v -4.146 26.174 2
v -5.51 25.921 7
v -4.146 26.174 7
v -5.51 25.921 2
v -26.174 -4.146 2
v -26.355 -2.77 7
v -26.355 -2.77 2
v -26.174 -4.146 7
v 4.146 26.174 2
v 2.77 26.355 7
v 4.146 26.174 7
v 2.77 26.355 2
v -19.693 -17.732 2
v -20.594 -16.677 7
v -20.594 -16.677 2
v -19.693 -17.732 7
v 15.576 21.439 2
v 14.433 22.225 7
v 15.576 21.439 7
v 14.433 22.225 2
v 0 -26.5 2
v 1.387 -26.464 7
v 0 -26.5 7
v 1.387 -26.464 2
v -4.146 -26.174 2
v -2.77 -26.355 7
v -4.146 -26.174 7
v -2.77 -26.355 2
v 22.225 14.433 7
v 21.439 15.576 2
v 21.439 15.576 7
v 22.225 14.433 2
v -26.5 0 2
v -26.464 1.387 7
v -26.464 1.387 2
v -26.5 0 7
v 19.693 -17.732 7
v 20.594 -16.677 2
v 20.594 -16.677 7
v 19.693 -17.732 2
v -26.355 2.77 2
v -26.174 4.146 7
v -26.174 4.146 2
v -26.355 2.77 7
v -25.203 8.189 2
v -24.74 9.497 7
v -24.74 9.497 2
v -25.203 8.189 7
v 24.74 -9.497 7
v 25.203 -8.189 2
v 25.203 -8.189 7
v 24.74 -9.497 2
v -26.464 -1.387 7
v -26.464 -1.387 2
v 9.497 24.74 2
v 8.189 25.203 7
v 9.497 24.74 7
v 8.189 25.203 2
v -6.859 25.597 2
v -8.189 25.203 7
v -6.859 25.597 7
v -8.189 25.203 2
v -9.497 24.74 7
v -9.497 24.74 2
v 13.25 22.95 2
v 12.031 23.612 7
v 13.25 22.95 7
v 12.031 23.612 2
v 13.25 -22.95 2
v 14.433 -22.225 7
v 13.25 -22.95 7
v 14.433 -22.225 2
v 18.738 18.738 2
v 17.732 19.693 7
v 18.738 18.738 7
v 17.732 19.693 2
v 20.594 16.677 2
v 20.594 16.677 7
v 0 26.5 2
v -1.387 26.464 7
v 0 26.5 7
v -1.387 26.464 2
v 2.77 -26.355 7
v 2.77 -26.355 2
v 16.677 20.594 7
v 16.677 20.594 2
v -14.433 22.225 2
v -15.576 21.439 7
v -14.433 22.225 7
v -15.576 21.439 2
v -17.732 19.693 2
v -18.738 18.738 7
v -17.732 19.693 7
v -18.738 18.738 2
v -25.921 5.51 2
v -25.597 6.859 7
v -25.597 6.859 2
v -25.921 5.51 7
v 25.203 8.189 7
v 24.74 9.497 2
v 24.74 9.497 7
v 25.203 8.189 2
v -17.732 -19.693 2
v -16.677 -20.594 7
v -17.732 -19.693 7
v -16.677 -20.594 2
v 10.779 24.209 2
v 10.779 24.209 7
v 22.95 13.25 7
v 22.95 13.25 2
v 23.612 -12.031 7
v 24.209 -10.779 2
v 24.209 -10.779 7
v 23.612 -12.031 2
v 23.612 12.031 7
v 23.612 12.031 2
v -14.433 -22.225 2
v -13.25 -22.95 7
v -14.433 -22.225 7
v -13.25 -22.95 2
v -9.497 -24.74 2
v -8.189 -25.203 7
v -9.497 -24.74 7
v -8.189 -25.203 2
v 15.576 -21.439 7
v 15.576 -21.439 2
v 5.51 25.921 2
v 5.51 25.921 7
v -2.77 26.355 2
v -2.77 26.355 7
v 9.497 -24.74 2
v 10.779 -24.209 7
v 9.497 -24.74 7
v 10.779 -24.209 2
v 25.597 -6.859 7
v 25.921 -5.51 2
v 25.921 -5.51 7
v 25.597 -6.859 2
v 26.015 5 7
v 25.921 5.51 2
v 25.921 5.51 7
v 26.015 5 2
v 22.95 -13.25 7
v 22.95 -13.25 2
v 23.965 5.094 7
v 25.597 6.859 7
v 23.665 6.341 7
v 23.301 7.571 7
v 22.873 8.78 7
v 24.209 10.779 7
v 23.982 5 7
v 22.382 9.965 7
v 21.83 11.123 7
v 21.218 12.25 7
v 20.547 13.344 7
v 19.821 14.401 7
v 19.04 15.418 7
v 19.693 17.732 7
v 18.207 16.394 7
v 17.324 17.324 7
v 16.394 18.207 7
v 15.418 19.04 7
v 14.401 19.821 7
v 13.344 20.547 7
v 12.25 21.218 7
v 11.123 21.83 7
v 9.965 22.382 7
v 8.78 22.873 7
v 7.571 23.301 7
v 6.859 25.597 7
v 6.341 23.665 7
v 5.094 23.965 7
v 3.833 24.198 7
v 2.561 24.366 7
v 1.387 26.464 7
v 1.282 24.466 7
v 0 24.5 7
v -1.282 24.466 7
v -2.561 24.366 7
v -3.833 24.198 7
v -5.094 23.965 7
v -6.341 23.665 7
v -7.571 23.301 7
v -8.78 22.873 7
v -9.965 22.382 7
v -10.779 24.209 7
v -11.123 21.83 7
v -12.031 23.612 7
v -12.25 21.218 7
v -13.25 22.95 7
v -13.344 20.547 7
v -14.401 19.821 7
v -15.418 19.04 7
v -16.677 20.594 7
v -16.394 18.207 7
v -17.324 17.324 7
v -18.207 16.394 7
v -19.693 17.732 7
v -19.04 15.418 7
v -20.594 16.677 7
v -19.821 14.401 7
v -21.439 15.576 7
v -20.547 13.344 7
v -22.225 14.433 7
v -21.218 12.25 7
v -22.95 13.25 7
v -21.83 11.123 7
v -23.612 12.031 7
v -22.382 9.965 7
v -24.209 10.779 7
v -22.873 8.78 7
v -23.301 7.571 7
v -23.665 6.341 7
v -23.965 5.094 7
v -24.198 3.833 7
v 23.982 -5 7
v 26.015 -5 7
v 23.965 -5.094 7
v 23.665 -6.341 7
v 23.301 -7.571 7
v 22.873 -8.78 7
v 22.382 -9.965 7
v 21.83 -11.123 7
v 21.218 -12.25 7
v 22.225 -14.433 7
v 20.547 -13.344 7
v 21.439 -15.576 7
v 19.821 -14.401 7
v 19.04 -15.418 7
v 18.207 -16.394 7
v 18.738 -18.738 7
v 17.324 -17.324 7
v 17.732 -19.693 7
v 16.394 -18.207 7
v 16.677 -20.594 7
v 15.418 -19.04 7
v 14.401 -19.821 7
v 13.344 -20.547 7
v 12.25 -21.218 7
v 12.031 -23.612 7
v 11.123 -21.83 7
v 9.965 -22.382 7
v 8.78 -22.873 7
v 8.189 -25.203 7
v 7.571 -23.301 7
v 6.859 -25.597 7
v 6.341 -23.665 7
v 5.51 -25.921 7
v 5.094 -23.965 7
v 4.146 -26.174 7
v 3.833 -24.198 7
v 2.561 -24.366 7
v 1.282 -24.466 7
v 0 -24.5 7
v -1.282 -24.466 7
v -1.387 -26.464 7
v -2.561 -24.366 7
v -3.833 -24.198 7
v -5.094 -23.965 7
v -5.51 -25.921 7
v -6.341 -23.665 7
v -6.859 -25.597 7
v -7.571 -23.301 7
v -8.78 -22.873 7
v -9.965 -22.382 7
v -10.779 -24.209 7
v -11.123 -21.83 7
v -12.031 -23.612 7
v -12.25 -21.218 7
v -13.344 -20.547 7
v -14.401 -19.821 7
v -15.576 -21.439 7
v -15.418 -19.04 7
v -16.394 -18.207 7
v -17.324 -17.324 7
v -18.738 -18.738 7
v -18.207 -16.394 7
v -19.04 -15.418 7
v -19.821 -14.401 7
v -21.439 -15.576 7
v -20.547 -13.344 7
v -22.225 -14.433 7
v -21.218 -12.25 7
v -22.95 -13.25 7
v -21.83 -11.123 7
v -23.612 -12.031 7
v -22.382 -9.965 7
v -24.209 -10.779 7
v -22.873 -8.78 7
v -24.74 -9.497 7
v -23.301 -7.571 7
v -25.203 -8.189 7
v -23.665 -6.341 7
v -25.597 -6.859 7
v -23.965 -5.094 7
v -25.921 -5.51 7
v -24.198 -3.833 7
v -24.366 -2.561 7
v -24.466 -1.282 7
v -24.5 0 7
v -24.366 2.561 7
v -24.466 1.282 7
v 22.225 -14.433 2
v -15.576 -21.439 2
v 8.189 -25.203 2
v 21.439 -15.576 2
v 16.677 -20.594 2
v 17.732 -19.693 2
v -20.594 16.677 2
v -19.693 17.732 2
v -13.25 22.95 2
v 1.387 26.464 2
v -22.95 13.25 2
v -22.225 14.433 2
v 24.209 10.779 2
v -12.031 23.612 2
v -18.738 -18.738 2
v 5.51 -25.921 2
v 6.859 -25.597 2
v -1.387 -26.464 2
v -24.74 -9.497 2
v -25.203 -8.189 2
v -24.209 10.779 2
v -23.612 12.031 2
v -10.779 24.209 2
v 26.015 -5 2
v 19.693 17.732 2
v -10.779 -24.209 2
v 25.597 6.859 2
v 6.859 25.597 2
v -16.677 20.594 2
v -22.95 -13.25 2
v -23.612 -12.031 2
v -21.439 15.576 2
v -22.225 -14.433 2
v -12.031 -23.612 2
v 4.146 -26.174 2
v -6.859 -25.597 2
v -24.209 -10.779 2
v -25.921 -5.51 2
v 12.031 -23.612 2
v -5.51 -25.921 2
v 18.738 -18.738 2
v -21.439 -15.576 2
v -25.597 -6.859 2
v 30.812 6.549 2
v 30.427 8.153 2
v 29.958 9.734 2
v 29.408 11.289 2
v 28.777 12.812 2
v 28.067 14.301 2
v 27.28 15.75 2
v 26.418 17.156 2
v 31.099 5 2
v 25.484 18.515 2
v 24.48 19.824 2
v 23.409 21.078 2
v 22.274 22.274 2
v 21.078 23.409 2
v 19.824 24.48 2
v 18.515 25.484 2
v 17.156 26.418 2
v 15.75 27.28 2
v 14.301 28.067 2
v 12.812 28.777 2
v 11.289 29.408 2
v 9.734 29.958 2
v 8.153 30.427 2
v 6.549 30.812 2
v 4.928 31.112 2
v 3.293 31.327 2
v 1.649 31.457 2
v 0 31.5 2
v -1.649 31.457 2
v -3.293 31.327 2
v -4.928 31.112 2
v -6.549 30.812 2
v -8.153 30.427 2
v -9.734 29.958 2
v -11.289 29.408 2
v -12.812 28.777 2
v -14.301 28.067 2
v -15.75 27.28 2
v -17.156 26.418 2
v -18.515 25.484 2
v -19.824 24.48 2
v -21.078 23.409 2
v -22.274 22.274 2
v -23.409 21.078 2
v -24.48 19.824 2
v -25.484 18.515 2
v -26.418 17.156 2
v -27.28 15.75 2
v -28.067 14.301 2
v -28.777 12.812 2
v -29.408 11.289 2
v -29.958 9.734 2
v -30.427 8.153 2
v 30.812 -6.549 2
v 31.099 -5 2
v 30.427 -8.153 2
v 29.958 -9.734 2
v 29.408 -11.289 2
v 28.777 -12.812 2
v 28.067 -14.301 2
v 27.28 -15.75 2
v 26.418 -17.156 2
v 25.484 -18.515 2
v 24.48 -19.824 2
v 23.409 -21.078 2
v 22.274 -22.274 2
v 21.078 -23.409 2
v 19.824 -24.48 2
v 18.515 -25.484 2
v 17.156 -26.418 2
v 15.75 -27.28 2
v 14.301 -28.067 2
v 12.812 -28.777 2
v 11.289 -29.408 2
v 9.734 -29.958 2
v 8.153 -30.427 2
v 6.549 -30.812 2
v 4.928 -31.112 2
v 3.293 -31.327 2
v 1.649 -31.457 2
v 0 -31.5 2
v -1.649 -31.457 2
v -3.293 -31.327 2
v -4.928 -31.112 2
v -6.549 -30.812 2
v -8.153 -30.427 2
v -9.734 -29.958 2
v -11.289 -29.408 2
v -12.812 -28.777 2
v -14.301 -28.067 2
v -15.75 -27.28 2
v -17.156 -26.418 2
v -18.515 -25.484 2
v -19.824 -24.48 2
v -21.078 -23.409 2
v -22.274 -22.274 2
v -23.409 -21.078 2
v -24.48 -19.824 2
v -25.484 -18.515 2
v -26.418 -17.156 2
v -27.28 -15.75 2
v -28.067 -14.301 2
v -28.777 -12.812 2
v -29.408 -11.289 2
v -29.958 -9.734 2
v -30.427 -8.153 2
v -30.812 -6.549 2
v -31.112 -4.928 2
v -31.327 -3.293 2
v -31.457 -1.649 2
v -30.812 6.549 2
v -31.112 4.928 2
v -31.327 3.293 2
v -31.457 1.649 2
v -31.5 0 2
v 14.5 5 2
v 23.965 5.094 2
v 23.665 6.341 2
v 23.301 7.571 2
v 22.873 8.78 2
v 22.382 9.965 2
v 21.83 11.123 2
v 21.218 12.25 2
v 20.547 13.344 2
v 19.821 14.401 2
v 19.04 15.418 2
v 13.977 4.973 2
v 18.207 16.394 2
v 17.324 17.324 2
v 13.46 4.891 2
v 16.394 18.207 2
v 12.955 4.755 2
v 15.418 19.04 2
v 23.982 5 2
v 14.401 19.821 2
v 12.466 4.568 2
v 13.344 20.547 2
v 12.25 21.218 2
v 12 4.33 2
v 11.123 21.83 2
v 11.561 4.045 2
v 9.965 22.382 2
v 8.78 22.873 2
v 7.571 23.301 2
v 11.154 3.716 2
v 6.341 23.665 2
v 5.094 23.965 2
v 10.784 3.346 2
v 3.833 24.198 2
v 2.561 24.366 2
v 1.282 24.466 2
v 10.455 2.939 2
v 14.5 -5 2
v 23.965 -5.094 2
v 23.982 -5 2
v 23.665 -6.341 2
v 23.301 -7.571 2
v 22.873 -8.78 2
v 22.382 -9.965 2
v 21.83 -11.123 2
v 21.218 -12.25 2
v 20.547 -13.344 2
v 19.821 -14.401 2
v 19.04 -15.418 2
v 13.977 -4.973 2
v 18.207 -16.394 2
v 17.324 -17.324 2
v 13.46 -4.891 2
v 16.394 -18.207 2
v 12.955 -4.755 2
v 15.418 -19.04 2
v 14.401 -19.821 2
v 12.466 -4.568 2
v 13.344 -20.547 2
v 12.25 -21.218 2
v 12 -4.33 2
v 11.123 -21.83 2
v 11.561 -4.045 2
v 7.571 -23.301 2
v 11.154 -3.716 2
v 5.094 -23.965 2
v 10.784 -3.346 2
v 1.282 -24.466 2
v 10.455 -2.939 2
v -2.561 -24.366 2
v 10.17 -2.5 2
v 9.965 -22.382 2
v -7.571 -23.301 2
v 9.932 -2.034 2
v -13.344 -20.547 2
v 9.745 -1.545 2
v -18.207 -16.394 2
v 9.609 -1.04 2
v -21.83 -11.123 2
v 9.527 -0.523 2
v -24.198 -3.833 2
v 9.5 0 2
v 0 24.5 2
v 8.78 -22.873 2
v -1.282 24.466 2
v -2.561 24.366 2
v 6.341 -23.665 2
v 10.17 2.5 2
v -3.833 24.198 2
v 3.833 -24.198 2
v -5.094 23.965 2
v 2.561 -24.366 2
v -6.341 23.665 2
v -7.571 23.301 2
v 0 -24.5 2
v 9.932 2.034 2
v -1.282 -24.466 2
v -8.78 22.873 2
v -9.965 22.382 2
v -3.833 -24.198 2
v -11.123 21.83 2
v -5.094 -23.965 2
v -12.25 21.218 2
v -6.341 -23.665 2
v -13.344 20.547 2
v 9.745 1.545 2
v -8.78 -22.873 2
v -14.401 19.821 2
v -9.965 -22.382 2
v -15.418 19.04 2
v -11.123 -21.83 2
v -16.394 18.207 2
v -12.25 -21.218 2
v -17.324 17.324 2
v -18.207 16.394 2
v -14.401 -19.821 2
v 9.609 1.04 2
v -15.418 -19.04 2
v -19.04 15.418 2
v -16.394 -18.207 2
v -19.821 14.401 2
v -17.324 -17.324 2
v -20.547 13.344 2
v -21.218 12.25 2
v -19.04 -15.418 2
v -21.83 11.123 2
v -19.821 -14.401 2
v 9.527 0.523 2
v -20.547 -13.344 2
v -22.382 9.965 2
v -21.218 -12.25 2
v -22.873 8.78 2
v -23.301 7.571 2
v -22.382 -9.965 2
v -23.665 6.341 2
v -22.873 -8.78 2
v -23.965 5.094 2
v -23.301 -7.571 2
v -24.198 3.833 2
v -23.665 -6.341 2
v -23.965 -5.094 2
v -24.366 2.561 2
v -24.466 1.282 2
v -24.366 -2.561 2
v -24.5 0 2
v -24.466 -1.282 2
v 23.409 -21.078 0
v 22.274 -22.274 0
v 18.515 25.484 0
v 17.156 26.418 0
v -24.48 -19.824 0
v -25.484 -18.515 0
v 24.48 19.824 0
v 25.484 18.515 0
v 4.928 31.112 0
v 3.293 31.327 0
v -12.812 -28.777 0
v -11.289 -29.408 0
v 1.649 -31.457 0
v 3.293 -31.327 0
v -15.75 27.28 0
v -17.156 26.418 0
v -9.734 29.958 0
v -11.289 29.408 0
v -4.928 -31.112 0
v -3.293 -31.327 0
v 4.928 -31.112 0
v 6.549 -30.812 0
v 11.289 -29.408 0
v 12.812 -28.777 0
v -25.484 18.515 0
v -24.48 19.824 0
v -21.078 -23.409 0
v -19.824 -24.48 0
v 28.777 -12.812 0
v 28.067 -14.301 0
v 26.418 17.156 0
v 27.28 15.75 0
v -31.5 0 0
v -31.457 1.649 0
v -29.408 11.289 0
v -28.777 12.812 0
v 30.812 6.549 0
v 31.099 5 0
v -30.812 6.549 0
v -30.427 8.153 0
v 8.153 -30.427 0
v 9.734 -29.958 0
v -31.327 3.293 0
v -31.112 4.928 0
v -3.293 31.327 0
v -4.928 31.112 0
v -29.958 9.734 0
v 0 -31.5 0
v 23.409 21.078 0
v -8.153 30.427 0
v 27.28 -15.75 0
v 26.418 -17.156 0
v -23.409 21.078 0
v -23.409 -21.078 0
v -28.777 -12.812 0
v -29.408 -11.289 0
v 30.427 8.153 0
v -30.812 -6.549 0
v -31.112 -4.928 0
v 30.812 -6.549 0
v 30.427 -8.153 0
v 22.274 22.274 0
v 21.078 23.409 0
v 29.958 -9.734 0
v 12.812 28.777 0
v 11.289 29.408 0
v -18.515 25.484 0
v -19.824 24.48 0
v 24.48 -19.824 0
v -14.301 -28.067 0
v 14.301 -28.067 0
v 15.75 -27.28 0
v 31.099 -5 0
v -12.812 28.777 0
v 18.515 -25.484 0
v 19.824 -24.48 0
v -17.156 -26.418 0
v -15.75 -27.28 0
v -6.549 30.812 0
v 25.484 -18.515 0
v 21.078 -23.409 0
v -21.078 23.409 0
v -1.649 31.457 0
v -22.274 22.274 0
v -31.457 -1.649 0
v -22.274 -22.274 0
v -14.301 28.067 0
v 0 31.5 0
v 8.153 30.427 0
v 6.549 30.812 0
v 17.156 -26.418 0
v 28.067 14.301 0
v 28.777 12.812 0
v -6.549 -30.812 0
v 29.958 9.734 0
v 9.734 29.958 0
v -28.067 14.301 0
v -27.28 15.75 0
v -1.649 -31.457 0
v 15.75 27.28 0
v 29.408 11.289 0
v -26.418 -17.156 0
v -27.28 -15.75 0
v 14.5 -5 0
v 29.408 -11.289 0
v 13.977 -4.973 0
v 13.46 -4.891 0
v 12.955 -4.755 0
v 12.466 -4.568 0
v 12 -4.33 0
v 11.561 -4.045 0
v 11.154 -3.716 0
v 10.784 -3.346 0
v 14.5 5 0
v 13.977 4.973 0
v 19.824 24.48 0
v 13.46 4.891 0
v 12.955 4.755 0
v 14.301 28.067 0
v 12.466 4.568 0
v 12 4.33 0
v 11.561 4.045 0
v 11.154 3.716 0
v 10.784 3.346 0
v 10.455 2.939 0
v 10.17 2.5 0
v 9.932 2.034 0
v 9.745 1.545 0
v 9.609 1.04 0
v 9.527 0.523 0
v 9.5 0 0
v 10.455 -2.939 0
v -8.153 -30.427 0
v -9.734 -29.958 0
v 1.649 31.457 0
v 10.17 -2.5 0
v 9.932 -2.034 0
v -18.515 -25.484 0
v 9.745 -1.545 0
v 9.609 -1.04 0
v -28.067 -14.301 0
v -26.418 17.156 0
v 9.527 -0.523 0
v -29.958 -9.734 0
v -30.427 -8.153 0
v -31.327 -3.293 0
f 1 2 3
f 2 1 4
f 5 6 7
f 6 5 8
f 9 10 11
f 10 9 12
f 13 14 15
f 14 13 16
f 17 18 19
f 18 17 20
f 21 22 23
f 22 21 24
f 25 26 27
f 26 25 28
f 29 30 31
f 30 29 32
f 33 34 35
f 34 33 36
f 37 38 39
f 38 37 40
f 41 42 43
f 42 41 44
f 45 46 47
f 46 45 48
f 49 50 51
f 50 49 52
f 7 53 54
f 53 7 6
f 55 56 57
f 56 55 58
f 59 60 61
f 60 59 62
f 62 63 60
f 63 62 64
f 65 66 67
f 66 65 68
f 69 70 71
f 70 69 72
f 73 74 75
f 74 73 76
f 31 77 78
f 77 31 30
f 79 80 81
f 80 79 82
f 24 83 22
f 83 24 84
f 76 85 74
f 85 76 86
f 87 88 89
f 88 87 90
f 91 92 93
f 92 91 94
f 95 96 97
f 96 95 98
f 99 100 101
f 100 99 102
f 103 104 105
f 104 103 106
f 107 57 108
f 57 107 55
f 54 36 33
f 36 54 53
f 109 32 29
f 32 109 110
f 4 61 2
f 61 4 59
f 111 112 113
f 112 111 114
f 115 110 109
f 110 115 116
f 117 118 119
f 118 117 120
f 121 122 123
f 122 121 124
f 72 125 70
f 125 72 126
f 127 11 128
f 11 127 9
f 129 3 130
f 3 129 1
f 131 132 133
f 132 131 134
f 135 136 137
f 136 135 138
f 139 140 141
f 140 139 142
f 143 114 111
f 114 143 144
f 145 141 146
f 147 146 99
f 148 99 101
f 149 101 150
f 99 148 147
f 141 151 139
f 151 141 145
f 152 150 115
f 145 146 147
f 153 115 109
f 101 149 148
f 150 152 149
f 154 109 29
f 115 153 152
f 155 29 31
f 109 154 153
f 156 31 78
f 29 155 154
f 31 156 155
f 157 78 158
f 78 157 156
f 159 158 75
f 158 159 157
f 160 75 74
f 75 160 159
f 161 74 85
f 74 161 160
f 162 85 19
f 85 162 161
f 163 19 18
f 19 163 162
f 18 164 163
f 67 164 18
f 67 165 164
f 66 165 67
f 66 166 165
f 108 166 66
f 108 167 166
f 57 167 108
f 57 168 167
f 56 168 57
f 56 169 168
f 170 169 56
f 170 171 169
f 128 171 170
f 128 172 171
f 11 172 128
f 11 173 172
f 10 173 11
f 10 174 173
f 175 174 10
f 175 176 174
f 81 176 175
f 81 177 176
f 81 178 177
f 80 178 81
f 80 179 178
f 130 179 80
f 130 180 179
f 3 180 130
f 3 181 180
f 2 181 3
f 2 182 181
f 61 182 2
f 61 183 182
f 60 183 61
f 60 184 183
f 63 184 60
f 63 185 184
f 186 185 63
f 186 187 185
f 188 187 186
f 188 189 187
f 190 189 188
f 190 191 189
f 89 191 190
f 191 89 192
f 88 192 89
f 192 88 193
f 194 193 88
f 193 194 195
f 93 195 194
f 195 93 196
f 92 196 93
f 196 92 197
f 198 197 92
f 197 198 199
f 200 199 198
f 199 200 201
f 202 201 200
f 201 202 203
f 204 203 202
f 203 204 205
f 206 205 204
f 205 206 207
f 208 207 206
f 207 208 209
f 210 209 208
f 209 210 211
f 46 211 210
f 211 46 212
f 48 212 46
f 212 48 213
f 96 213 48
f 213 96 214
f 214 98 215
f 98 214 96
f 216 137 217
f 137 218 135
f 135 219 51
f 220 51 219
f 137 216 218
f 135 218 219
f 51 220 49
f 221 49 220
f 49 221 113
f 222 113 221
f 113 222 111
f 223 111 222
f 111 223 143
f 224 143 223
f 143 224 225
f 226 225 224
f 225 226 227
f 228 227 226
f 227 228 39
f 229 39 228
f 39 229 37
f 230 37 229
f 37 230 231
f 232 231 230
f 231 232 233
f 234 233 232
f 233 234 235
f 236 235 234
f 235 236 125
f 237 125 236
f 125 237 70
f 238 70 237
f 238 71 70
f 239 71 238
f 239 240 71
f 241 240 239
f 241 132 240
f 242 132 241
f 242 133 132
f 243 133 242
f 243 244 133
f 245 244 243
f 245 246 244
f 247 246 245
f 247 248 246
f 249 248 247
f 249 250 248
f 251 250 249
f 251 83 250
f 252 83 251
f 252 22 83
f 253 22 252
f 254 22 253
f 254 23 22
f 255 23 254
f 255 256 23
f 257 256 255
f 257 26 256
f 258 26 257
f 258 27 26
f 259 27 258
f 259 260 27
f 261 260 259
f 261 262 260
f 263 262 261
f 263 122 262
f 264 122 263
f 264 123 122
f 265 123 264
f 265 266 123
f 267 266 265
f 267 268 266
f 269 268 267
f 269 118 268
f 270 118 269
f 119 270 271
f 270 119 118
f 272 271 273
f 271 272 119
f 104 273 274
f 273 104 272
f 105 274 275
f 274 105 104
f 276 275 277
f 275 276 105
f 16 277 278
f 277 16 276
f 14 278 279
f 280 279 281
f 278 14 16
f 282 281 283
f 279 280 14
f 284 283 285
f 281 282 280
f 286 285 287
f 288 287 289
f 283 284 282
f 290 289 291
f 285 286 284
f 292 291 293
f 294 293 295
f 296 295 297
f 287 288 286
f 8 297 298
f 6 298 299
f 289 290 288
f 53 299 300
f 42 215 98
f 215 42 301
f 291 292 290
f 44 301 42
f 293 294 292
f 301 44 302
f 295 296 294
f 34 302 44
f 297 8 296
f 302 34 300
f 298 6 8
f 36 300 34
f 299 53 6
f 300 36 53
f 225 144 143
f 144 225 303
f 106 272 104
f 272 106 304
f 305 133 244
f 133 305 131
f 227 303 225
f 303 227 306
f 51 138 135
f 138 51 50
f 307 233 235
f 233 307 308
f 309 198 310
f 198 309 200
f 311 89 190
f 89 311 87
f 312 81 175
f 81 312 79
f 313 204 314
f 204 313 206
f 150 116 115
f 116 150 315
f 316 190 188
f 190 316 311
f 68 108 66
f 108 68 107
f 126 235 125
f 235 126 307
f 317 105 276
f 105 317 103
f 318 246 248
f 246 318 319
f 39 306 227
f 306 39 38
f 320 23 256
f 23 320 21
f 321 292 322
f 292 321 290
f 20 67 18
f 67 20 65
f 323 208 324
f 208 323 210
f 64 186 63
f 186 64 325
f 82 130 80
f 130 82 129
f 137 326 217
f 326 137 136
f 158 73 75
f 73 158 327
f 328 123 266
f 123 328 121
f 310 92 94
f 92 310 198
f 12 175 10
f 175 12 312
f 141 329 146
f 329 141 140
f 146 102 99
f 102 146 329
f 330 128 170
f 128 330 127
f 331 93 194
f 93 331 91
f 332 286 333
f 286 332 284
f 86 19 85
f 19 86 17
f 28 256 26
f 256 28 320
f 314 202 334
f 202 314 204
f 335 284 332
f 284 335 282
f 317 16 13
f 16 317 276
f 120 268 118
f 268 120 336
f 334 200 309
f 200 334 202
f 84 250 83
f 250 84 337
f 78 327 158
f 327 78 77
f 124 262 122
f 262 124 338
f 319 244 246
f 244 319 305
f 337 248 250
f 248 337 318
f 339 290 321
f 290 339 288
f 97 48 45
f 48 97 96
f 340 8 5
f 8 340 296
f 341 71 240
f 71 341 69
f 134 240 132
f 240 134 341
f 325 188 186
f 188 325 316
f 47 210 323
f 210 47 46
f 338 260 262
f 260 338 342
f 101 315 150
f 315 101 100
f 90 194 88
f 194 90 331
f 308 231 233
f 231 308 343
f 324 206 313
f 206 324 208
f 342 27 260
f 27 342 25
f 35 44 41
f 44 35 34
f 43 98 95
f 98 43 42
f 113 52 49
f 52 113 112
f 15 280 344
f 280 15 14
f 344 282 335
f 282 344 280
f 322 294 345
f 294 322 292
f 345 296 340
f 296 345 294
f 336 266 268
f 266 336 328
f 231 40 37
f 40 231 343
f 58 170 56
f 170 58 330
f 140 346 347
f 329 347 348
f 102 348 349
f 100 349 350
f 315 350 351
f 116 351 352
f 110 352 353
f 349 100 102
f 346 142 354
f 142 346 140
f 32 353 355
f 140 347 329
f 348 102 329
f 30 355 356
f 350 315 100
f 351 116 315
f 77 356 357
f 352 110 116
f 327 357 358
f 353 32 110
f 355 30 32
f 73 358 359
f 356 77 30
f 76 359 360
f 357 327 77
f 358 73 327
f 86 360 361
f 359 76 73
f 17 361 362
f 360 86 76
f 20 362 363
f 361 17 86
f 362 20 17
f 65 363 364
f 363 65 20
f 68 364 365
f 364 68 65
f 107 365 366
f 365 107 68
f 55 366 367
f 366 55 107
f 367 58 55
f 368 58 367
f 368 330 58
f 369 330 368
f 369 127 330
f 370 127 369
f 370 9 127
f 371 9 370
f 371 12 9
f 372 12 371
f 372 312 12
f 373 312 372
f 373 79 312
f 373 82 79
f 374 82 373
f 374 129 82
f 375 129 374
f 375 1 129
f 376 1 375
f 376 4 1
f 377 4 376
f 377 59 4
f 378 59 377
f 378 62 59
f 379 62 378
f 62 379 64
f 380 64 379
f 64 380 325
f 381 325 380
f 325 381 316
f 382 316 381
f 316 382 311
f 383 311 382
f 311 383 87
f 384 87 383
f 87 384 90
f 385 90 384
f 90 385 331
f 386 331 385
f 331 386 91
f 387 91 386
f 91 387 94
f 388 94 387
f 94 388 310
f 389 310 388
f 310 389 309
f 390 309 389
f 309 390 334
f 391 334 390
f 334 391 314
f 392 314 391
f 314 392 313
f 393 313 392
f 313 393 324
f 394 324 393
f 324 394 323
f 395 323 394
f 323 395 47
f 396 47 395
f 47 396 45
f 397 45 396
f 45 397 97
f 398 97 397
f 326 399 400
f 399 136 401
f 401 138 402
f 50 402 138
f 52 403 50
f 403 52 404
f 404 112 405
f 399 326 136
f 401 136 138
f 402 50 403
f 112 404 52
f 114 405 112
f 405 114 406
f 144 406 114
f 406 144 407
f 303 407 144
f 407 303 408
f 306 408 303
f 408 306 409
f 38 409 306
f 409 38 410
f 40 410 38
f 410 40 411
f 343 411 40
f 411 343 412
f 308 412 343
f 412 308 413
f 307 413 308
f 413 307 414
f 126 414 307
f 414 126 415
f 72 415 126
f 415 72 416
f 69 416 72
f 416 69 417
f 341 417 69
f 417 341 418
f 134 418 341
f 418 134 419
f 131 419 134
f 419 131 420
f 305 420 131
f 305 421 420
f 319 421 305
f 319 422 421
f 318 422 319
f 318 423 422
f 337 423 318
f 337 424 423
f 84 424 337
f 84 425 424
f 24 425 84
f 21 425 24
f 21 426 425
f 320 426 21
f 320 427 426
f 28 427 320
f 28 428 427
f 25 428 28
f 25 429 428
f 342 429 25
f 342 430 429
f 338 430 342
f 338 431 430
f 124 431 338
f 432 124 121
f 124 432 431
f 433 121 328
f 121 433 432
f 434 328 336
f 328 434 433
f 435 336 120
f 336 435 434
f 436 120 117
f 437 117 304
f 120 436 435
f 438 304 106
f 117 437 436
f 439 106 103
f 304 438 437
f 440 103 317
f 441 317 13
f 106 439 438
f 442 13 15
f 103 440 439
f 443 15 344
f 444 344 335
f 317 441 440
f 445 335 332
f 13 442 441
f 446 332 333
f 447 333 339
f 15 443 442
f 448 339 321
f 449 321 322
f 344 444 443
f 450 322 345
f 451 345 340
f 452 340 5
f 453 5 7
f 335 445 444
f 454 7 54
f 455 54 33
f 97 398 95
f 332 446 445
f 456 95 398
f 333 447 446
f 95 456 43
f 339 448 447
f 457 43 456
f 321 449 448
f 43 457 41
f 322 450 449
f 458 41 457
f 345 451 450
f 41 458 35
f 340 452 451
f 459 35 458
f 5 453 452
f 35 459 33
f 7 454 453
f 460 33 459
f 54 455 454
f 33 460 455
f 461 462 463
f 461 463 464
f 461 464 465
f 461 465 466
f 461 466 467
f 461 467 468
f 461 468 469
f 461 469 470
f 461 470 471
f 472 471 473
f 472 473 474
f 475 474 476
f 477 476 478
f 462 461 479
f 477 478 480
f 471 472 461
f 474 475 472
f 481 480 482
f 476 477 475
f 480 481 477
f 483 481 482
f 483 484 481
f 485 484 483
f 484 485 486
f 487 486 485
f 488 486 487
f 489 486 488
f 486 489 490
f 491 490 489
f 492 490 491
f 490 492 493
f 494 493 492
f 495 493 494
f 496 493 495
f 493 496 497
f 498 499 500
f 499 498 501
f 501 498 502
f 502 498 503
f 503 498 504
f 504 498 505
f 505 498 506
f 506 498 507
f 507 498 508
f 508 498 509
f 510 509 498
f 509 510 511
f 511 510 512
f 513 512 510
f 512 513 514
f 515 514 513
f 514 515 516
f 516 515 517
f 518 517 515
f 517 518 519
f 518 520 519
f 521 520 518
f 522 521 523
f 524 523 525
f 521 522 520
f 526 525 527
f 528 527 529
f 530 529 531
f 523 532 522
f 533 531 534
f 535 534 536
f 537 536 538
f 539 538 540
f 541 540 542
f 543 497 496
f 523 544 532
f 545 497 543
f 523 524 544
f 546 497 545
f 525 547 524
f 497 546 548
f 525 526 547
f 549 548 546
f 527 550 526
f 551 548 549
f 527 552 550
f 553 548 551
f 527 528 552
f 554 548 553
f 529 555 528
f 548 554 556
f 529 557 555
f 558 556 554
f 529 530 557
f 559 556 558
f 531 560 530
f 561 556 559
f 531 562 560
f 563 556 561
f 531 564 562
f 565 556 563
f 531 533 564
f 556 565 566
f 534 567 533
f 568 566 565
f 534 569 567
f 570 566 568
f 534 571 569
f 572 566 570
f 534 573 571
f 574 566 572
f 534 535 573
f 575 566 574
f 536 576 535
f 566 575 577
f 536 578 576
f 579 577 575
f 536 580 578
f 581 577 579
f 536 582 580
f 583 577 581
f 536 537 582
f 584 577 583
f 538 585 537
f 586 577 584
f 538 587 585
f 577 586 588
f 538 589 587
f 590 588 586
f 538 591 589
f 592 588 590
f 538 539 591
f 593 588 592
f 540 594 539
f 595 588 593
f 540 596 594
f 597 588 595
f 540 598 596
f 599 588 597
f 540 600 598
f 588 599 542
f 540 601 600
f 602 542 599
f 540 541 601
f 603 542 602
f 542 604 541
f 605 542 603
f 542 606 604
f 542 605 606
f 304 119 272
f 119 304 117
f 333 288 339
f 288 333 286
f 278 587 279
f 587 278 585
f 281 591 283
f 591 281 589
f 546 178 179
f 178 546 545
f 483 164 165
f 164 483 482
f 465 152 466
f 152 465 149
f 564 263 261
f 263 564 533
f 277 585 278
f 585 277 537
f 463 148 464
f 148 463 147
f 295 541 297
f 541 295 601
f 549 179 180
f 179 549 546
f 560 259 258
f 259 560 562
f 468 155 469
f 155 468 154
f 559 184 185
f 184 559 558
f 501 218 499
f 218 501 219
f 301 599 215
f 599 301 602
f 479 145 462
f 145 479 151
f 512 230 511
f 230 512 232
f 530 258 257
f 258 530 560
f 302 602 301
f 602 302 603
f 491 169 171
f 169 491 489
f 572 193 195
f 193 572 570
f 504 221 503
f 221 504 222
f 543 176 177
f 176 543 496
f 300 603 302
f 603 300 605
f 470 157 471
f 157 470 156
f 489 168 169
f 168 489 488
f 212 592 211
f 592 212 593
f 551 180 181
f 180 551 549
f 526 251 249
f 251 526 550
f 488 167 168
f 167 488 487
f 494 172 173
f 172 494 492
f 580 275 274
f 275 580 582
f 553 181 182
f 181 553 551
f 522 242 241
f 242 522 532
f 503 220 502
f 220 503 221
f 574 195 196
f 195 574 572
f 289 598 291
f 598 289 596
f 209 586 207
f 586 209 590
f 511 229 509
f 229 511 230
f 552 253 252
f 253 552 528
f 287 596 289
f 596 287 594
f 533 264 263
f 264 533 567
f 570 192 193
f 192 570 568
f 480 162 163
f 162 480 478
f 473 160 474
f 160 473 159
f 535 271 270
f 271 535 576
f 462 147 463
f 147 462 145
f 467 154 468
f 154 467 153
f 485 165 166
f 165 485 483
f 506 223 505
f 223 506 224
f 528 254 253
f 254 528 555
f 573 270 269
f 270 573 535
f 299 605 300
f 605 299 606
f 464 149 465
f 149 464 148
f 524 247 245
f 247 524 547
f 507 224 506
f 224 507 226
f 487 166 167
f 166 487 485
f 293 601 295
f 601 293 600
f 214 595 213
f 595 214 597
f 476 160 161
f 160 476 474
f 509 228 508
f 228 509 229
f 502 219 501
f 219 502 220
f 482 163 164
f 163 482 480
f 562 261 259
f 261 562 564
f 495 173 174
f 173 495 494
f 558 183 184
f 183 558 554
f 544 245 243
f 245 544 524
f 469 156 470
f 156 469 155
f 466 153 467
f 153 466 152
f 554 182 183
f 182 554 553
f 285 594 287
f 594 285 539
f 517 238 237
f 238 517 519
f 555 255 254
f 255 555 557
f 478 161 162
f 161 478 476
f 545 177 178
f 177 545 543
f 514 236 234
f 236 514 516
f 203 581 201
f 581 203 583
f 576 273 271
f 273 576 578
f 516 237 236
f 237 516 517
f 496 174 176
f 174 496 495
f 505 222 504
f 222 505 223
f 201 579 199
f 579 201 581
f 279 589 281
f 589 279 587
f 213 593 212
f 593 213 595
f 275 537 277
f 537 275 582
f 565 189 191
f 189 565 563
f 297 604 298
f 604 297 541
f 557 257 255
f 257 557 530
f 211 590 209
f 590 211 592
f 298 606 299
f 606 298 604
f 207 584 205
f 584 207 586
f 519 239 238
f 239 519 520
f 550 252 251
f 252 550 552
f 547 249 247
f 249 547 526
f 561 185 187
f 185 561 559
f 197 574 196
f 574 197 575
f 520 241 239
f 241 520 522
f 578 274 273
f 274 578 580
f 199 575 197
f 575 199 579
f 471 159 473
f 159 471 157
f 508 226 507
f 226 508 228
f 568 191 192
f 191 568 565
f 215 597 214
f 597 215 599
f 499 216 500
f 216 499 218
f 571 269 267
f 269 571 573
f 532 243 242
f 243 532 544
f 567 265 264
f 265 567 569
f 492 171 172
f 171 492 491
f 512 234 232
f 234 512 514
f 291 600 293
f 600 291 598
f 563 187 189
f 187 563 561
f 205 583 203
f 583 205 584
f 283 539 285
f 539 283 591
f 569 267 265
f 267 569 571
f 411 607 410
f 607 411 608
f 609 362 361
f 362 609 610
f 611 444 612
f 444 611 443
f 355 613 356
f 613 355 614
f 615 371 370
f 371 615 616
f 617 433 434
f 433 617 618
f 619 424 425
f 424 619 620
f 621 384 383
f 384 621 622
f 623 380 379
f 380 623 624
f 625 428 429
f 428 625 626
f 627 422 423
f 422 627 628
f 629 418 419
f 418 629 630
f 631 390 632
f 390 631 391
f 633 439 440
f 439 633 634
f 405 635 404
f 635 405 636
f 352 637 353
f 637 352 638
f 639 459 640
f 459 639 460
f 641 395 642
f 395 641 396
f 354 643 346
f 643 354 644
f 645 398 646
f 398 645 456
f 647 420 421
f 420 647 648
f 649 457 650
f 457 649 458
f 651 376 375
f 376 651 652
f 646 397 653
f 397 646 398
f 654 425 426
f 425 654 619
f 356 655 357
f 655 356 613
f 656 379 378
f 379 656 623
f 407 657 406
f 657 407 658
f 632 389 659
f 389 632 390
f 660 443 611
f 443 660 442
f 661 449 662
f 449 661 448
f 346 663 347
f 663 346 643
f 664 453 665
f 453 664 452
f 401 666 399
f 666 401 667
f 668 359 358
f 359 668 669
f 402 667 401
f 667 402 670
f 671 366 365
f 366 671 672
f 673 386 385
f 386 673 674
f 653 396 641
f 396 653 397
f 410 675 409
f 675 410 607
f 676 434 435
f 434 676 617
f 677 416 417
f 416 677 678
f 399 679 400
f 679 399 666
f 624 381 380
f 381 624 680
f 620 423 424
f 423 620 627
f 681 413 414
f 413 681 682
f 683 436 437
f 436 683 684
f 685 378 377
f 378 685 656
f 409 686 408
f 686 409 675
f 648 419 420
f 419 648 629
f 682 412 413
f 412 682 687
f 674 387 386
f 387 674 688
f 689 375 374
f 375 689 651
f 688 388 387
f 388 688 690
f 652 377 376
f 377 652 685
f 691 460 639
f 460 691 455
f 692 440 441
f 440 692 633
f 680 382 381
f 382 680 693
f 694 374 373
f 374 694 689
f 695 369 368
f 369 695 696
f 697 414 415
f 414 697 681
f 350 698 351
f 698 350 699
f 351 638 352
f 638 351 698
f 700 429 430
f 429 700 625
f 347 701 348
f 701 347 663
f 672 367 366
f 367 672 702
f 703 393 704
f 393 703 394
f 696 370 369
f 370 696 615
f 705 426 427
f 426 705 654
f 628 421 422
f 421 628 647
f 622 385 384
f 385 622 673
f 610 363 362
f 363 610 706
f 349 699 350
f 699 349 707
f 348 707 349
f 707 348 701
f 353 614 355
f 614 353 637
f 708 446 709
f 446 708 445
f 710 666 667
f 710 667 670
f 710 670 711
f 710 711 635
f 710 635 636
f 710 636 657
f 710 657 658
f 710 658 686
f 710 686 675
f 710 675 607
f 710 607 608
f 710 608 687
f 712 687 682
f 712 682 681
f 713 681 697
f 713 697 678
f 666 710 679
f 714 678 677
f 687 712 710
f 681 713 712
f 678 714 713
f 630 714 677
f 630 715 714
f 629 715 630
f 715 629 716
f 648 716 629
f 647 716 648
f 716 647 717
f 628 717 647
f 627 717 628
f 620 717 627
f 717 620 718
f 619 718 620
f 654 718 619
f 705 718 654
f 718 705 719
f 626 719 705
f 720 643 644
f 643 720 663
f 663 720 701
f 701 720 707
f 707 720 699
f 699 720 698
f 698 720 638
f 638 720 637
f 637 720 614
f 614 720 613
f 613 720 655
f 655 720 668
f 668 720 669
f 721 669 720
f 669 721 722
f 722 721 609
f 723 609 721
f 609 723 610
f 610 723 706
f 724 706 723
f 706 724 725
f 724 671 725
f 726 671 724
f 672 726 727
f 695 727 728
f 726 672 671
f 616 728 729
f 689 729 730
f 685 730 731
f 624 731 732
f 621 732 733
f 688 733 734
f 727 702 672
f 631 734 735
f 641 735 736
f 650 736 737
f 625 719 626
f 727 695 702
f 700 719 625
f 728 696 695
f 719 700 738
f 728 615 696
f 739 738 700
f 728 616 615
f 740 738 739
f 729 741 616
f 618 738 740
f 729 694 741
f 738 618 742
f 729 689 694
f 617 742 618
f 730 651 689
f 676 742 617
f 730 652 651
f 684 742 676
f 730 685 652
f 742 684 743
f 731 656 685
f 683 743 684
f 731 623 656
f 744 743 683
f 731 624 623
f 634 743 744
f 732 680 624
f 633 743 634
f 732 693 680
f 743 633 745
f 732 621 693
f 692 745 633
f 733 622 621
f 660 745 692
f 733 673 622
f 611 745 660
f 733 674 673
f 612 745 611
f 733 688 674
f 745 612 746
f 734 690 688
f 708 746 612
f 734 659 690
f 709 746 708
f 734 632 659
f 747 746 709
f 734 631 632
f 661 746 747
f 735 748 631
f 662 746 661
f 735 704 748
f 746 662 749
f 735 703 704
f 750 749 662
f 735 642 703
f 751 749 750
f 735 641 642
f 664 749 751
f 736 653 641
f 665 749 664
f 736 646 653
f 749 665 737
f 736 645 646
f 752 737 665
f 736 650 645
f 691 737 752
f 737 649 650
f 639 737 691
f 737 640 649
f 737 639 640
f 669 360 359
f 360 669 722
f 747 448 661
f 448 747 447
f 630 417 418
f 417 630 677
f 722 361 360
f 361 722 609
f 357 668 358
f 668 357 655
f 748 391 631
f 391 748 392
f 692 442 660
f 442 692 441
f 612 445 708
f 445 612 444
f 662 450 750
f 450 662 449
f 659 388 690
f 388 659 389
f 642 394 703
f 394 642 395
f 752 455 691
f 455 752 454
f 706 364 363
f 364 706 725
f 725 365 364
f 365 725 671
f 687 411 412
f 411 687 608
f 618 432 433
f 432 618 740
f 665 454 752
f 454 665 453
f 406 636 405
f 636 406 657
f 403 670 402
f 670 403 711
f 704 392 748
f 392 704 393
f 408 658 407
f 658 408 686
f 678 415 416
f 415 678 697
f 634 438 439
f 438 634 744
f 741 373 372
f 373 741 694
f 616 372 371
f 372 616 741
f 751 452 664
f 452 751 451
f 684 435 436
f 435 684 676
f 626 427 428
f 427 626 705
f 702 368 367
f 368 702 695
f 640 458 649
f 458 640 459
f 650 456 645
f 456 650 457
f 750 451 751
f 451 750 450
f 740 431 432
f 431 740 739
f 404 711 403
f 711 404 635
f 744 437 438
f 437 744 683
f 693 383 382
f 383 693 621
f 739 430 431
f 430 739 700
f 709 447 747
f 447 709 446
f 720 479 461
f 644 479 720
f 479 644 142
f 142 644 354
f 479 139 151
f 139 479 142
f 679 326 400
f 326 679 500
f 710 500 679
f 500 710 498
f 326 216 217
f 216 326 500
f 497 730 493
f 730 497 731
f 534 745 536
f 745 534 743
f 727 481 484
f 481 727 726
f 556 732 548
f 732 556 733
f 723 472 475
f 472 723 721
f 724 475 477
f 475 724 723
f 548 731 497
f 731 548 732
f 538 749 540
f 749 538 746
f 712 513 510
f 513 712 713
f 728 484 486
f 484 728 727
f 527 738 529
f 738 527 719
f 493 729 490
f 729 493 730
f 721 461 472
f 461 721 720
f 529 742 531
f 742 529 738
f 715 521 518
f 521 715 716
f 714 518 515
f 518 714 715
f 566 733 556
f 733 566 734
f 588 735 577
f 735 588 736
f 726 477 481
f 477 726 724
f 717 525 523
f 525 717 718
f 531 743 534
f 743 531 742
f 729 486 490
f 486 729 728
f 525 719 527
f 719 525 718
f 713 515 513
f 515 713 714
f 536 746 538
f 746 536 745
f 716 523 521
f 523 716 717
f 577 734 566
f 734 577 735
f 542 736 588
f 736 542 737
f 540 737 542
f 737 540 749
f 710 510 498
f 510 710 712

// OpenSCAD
thickness = 2;
hole_diameter = 53;
hole_radius = hole_diameter / 2;
cap_diameter = hole_diameter + 10;
cap_radius = cap_diameter / 2;
cap_height = 5;
slit_width = 10 ;
slit_depth = cap_radius - hole_radius + thickness + slit_width;

total_height = thickness + cap_height;
slit_radius = slit_width / 2;

difference() {
    union() {
        cylinder(h=thickness, r=cap_radius, $fn=120);

        translate([0, 0, thickness])
            difference() {
                cylinder(h=cap_height, r=hole_radius, $fn=120);
                cylinder(h=cap_height + 1, r=(hole_radius - thickness), $fn=120);
            }
    }

    // Side slit with rounded inner end.
    translate([cap_radius - slit_depth, -slit_radius, -0.5])
        union() {
            cube([slit_depth + 1, slit_width, total_height + 1]);
            translate([0, slit_radius, 0])
                cylinder(h=total_height + 1, r=slit_radius, $fn=60);
        }
    }
